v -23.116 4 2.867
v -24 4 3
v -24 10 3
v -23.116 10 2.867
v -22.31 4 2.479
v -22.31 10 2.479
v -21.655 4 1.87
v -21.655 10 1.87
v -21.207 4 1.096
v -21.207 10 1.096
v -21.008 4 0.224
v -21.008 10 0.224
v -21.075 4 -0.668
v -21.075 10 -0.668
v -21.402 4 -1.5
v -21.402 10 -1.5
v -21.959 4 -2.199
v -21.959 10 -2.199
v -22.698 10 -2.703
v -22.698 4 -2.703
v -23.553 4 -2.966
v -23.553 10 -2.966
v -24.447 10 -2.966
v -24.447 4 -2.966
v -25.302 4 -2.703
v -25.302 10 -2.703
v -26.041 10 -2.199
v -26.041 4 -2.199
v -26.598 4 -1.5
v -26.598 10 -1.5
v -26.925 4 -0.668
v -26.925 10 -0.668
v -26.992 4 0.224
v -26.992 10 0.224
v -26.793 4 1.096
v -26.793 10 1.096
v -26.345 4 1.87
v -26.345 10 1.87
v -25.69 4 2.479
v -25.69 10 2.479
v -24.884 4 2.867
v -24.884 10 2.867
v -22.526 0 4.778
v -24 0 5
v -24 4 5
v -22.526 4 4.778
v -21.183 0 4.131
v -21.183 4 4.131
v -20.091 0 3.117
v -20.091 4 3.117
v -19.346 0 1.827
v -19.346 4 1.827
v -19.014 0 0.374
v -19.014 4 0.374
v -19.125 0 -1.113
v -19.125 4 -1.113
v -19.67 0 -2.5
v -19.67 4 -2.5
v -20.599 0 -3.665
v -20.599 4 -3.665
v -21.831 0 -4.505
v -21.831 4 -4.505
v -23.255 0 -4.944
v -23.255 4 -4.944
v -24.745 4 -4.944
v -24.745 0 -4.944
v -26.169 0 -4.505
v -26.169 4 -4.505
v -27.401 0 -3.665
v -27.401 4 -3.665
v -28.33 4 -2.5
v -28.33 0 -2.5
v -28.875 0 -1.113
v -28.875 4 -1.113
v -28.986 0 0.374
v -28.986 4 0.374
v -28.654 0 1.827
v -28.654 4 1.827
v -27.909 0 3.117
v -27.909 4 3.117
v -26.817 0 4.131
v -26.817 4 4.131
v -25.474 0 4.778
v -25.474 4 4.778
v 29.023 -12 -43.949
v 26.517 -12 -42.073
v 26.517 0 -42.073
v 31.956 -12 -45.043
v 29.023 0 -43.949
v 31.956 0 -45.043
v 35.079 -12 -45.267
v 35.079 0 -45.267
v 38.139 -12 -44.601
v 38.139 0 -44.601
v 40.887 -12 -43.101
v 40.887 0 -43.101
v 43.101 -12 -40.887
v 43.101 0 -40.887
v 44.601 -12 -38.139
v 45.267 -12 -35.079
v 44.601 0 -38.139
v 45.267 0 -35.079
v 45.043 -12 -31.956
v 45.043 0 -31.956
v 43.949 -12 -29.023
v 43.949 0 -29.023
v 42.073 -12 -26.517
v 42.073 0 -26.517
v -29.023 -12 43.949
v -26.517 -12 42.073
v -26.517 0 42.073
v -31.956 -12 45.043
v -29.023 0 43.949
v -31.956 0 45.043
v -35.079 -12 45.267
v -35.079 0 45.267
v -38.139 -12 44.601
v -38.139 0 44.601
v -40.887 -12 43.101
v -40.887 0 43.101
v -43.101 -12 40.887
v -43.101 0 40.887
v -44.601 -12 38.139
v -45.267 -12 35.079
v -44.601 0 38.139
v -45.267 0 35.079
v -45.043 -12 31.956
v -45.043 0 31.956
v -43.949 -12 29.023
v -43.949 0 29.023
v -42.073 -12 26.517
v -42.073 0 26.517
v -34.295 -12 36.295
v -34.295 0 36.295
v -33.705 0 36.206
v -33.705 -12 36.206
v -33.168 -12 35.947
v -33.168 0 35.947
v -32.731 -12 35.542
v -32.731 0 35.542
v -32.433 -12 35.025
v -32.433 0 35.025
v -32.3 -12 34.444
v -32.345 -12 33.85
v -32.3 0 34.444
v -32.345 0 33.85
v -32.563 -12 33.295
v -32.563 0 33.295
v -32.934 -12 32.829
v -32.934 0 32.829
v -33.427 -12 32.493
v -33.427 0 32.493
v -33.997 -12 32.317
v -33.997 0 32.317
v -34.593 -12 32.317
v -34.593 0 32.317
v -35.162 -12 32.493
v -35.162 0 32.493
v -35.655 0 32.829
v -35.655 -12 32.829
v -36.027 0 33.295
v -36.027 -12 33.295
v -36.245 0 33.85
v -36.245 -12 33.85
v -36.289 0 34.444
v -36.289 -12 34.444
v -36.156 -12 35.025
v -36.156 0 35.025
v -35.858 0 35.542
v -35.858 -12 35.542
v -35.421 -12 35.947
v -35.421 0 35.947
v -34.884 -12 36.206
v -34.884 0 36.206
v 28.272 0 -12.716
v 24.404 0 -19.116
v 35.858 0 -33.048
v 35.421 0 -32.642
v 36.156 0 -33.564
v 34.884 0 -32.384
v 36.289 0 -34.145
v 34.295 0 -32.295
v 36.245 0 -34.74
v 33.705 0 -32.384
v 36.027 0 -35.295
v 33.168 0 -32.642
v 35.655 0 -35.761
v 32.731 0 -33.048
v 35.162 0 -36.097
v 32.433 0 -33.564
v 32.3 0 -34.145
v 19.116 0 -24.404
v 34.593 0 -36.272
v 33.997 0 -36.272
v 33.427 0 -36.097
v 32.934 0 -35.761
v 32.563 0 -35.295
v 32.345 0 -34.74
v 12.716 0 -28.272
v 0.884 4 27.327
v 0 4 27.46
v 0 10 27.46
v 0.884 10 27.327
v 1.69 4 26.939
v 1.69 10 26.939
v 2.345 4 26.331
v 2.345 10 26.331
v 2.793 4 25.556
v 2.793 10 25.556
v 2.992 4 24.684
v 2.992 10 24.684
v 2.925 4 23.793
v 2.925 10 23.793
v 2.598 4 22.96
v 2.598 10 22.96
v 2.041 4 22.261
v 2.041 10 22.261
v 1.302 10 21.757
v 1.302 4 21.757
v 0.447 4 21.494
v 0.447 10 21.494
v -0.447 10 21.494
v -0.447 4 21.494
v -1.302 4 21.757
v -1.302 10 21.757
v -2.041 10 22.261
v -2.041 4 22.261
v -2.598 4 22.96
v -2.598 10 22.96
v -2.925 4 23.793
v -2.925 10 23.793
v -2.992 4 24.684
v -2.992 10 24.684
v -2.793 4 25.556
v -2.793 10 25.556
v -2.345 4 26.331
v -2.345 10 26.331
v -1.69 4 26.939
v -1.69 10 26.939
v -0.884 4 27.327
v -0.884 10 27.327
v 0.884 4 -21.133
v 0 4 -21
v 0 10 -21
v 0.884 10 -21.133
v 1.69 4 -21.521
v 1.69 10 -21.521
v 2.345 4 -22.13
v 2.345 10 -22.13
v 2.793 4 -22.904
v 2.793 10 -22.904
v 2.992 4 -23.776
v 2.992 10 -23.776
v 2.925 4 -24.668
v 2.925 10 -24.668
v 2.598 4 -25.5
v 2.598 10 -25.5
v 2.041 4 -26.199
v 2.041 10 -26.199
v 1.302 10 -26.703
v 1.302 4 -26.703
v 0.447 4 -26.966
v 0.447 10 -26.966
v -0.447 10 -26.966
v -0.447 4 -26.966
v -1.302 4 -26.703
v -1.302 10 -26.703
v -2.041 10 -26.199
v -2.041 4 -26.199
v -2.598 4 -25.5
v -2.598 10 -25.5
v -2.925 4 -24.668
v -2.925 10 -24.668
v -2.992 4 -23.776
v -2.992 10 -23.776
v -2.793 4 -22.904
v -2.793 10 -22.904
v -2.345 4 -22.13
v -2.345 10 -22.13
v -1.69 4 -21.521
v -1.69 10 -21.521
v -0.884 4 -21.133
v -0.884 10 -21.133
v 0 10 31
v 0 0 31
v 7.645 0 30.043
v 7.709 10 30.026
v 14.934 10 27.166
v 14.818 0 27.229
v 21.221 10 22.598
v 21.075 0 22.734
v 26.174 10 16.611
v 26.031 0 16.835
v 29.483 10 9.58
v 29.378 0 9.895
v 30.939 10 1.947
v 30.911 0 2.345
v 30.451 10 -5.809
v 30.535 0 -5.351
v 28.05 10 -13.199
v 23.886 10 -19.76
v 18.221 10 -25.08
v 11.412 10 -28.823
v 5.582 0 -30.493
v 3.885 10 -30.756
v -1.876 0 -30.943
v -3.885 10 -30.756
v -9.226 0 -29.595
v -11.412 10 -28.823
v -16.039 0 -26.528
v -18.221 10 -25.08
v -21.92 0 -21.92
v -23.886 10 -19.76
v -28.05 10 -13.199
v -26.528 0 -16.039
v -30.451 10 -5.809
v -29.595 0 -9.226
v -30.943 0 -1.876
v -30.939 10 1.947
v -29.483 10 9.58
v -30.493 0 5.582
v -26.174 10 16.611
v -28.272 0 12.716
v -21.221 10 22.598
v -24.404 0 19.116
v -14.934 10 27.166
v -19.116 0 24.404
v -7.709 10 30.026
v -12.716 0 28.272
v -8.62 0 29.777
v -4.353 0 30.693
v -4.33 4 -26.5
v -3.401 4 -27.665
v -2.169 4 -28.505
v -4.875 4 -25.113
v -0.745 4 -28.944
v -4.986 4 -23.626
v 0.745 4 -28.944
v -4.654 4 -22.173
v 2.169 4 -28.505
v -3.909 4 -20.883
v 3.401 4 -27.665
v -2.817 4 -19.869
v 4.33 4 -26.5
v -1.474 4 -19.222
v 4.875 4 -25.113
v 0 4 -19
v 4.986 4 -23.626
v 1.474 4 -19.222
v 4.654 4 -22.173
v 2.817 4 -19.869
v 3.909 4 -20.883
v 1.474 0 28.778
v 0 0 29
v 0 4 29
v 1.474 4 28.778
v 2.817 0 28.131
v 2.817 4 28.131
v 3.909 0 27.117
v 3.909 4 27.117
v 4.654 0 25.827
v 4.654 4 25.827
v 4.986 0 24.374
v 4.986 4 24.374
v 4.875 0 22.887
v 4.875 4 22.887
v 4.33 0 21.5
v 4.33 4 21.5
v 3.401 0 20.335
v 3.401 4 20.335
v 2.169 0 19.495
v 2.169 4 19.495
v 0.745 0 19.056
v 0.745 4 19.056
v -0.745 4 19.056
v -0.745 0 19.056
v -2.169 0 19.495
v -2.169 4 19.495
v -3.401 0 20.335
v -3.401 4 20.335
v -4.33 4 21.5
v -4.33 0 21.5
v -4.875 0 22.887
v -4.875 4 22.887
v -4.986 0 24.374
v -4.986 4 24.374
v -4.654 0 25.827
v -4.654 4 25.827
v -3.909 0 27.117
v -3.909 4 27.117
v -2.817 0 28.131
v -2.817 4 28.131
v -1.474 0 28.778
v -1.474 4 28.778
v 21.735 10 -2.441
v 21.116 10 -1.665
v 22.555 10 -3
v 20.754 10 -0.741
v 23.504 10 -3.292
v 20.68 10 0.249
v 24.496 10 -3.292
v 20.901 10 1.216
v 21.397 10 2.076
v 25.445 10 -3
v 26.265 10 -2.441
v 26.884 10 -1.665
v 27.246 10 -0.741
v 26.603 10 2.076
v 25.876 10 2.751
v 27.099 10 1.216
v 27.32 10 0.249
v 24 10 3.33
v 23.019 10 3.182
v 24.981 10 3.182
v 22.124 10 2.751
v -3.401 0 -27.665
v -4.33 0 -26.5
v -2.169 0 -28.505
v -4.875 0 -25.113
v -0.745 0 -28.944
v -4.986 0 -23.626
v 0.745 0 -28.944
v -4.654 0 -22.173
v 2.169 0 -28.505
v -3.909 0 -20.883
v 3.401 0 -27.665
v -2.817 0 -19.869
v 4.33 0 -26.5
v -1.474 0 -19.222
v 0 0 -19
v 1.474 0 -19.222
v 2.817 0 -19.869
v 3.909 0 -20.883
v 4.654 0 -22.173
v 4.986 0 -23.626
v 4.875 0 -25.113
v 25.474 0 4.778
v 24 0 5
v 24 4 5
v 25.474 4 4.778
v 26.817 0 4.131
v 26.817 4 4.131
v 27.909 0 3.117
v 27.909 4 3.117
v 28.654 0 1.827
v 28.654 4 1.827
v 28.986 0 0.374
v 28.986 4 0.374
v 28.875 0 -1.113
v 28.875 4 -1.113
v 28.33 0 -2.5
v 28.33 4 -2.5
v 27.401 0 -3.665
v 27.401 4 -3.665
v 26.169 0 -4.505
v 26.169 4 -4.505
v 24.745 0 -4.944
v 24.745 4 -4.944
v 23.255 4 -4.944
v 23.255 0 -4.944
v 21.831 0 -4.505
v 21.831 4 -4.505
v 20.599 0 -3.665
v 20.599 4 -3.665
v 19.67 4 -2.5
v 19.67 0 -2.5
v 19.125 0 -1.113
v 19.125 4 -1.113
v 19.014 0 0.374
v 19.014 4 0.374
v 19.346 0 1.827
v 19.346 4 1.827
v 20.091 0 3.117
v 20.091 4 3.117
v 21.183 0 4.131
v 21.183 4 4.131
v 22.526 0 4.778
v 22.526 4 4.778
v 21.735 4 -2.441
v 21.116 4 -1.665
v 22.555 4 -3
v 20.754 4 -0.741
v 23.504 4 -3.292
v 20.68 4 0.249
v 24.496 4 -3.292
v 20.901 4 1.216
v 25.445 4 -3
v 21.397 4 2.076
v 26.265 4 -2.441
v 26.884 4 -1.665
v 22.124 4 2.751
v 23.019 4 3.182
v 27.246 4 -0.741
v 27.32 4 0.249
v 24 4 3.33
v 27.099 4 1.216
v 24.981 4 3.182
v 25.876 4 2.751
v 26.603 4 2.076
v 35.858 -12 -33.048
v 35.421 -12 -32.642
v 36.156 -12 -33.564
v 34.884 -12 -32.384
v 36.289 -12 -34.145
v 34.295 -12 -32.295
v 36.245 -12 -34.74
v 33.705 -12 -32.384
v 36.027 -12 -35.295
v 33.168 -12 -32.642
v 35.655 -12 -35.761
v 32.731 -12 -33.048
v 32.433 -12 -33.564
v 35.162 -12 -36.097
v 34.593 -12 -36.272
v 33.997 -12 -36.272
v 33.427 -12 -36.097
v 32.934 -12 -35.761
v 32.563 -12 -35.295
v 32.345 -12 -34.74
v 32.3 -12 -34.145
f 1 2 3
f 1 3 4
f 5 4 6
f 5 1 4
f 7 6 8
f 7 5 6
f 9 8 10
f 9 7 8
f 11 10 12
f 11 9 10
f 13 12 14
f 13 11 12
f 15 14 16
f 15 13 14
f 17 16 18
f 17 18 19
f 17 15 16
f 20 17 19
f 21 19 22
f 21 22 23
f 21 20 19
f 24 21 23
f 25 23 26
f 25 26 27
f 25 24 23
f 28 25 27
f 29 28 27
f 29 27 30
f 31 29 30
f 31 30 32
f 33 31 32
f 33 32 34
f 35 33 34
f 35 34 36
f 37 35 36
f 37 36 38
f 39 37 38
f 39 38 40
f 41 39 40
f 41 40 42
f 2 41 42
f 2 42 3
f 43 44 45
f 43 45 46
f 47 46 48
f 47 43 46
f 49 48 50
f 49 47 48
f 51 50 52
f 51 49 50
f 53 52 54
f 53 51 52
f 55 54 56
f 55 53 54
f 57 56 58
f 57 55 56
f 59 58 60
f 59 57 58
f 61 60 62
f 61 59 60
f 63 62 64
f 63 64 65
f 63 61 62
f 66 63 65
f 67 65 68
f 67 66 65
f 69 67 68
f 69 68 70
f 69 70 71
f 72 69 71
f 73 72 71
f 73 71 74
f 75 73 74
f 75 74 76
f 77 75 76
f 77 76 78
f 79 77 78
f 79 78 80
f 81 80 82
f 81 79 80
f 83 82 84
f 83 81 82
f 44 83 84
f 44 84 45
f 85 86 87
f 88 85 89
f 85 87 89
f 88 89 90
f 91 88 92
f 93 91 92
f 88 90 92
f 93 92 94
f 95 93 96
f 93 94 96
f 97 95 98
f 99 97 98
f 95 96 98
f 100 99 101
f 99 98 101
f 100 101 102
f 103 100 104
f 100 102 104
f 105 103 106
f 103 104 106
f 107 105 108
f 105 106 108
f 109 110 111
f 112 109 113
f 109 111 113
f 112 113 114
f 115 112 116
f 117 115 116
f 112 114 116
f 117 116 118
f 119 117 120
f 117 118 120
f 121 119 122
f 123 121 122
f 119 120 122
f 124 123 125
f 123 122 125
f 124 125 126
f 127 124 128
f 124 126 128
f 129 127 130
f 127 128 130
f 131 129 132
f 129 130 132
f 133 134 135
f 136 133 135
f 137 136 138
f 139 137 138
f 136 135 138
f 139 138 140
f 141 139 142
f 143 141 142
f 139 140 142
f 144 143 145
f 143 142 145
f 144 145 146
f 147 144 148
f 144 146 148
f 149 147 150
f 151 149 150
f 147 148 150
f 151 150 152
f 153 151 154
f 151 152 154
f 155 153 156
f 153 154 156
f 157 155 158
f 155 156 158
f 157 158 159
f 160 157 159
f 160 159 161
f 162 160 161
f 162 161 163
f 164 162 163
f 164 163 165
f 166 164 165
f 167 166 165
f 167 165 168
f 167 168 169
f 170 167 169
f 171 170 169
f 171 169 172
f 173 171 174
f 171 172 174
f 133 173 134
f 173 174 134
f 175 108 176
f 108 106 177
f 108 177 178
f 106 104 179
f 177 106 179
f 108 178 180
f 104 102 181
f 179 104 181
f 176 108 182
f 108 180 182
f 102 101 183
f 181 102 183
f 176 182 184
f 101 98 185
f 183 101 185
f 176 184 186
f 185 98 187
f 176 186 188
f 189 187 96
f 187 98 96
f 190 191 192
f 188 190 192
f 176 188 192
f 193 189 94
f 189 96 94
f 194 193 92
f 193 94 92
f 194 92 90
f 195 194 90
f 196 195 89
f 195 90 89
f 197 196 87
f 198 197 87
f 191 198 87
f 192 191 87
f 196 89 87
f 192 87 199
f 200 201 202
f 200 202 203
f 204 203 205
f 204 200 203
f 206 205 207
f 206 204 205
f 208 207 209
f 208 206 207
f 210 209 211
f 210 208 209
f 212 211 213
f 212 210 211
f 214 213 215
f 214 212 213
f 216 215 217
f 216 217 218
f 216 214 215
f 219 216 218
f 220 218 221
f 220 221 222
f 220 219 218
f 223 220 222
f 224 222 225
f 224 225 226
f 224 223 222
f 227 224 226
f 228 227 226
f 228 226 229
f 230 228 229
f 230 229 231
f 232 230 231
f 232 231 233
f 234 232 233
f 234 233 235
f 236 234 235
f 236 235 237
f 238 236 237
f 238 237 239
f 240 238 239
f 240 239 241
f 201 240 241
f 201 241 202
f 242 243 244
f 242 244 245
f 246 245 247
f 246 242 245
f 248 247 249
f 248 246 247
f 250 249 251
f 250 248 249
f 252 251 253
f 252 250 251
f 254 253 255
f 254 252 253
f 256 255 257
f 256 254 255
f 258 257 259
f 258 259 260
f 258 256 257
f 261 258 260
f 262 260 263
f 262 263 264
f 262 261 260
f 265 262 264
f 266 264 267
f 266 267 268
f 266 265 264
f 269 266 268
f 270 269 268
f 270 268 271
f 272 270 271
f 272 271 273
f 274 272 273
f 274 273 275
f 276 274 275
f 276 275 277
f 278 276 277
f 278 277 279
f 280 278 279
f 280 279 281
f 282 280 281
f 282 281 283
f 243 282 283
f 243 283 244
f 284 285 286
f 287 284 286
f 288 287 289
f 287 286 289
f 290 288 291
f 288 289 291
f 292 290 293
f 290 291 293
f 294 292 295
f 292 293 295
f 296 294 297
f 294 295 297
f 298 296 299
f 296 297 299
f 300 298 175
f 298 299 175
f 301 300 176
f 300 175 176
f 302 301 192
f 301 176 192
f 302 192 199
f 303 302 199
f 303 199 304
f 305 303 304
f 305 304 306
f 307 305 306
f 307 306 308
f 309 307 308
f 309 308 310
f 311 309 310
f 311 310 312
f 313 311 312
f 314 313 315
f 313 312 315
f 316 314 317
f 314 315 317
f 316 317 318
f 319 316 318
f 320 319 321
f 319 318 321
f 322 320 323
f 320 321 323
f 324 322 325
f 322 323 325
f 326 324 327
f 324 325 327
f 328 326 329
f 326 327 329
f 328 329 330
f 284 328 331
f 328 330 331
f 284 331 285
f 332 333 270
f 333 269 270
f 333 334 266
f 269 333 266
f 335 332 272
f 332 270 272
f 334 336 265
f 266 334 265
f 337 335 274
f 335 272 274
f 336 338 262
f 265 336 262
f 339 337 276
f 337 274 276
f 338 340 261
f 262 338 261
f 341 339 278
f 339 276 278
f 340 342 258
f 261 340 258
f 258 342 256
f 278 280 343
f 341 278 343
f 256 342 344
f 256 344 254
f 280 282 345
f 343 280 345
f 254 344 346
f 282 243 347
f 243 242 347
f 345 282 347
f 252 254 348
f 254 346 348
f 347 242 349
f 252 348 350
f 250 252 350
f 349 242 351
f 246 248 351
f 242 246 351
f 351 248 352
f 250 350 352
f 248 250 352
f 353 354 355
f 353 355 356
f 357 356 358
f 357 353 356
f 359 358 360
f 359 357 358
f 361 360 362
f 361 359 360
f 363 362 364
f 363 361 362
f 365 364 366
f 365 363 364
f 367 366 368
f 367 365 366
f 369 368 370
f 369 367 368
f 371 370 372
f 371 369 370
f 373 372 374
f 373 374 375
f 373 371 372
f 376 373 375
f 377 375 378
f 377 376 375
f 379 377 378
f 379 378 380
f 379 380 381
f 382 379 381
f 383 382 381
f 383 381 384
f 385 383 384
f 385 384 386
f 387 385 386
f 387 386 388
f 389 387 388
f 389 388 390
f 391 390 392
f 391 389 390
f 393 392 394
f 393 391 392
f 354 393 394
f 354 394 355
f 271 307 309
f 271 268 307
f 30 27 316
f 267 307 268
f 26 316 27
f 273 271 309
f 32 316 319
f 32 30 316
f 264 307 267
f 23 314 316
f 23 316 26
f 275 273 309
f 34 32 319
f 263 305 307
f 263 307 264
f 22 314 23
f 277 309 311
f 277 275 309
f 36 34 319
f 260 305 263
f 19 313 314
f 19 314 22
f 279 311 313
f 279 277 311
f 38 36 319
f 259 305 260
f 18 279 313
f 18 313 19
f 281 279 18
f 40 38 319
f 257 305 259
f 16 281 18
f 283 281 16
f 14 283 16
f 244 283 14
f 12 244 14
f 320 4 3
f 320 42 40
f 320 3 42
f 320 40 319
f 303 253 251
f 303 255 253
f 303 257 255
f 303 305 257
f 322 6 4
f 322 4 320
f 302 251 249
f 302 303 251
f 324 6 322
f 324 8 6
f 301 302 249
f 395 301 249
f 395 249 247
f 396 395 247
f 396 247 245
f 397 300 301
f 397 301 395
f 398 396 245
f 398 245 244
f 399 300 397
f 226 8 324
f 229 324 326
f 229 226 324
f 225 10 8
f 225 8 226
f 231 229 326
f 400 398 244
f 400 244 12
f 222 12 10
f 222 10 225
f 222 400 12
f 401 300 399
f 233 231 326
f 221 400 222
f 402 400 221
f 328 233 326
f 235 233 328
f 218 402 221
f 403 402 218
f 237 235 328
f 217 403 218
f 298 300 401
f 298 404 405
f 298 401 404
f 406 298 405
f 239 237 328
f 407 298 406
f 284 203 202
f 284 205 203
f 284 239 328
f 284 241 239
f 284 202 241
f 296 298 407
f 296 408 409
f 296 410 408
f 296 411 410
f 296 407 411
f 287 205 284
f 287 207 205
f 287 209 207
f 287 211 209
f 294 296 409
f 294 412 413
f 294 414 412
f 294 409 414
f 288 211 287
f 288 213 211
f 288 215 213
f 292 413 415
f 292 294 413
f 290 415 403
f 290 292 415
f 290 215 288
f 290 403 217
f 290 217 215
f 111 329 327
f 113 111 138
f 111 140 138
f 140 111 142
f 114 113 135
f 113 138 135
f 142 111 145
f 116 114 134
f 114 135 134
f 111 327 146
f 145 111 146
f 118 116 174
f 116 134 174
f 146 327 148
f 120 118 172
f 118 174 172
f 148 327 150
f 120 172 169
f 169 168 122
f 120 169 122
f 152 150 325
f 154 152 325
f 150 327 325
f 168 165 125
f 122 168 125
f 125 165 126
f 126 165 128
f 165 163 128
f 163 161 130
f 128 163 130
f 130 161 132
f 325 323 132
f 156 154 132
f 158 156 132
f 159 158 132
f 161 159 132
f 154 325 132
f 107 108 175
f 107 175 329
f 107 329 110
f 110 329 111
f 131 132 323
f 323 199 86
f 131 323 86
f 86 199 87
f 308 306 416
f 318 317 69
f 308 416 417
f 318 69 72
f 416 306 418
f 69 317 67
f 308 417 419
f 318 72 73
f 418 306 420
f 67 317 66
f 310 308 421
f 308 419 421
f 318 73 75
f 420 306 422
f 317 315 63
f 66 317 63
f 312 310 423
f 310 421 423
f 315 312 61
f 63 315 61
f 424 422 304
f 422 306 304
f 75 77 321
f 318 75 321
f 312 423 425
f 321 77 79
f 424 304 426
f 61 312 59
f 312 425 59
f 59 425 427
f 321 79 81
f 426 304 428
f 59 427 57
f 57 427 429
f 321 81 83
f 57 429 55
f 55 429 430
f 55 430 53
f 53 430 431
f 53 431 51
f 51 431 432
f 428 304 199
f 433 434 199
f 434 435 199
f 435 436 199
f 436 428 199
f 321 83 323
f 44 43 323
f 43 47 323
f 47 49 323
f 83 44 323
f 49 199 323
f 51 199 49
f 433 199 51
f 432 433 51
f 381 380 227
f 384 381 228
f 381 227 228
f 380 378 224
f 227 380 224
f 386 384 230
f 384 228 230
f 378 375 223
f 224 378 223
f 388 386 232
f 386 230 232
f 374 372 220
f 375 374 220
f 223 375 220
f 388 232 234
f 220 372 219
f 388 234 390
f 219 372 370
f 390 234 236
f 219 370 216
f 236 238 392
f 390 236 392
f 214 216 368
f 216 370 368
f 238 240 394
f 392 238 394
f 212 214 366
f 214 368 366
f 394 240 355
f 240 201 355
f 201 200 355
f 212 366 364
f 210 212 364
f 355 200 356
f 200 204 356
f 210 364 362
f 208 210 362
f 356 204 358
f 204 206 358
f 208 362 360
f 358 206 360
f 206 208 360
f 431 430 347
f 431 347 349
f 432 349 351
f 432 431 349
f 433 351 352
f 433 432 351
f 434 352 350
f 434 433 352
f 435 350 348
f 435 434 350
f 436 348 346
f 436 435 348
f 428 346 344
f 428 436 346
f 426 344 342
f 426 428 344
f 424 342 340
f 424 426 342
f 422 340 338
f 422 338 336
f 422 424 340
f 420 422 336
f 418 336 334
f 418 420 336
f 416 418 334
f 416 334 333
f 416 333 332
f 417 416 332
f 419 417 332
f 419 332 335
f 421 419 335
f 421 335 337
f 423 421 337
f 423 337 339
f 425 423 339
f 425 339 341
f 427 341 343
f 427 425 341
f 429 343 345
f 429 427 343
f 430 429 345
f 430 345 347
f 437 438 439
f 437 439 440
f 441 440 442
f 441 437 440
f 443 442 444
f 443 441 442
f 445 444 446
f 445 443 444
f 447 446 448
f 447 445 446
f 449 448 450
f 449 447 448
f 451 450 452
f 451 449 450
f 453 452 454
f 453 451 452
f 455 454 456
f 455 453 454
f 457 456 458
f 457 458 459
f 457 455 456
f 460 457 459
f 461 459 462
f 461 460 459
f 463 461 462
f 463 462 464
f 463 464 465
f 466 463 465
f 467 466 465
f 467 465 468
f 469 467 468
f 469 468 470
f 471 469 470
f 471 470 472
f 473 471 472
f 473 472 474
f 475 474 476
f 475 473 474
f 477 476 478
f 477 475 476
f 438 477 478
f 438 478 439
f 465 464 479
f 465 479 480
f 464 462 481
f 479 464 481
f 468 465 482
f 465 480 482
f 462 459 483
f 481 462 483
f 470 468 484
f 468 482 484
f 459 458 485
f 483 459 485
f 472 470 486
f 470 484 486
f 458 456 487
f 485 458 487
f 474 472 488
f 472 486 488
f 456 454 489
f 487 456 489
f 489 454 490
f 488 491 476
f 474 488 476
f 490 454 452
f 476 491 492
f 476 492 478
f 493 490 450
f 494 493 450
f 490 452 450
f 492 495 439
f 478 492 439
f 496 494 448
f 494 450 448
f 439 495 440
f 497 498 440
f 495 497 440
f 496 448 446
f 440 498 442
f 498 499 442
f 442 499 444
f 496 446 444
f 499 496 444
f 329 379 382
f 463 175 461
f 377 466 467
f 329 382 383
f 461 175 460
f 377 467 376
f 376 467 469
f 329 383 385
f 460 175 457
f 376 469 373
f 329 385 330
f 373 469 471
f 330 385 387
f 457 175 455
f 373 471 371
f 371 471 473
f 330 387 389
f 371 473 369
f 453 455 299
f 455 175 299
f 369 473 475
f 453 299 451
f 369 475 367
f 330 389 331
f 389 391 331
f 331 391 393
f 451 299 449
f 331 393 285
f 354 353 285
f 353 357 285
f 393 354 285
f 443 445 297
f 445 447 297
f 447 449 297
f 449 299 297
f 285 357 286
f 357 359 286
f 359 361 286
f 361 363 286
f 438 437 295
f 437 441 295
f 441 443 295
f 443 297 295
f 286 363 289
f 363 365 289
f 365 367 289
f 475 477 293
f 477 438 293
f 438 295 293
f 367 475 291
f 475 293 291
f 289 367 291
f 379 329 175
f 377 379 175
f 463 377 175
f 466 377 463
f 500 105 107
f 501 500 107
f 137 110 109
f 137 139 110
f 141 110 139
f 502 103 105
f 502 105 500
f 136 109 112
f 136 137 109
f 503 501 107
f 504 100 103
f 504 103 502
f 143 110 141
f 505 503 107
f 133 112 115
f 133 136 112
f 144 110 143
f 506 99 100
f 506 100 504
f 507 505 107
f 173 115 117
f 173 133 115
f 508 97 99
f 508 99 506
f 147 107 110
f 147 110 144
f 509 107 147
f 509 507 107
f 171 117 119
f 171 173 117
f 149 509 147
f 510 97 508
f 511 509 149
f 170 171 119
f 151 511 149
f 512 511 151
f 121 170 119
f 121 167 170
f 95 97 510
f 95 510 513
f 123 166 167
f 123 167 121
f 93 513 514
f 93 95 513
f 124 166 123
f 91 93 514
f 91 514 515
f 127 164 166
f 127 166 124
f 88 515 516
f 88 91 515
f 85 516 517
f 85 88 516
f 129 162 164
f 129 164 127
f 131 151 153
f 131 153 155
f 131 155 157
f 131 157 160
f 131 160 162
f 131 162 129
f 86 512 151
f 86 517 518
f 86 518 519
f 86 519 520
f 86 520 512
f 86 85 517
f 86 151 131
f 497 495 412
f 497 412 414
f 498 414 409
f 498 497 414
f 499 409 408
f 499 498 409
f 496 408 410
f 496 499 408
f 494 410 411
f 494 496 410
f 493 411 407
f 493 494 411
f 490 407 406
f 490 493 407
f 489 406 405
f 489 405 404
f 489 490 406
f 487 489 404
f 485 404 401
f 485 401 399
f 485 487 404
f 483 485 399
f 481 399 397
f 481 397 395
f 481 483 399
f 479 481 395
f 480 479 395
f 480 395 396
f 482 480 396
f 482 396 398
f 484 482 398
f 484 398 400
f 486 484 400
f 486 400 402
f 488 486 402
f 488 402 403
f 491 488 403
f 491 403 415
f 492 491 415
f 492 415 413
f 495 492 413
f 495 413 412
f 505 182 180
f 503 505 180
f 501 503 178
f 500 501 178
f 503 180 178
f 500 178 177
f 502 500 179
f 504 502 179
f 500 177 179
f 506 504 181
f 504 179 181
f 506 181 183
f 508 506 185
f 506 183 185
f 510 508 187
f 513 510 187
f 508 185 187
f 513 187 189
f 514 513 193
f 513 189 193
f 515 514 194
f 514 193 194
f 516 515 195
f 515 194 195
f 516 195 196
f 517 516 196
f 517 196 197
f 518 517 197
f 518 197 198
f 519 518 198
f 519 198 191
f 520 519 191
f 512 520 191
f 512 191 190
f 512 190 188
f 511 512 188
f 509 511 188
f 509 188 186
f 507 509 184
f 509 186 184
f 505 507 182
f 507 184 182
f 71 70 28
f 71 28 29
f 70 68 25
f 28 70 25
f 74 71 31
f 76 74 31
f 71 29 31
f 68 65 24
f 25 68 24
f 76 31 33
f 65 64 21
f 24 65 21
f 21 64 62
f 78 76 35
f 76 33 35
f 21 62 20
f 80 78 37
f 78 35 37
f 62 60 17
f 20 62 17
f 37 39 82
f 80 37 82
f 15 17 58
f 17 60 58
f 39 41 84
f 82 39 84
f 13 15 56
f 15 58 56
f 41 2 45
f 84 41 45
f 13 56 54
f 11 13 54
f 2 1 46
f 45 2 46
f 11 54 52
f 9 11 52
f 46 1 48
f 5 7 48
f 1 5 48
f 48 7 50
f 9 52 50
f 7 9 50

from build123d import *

# Parameters (mm, degrees)
SKETCH1_R           = 31
BOSS_EXTRUDE1_DEPTH = 10
SKETCH3_R           = 5
CUT_EXTRUDE1_DEPTH  = 4
SKETCH5_R           = 5
CUT_EXTRUDE2_DEPTH  = 4
SKETCH6_R           = 3
SKETCH6_R_2         = 3.329647993
CUT_EXTRUDE3_DEPTH  = 10
SKETCH10_R          = 2
BOSS_EXTRUDE5_DEPTH = 12


with BuildPart() as part:
    # Sketch1 → Boss-Extrude1 (new body)
    with BuildSketch(Plane(origin=(0, 0, 0), x_dir=(1, 0, 0), z_dir=(0, 1, 0))):
        with Locations(Location((0, 0, 0), (0, 0, 270))):
            Circle(SKETCH1_R)
    extrude(amount=BOSS_EXTRUDE1_DEPTH)

    # Sketch3 → Cut-Extrude1 (cut)
    with BuildSketch(Plane(origin=(0, 0, 0), x_dir=(1, 0, 0), z_dir=(0, 1, 0))):
        with Locations(Location((0, 24, 0), (0, 0, 270))):
            Circle(SKETCH3_R)
    extrude(amount=CUT_EXTRUDE1_DEPTH, mode=Mode.SUBTRACT)

    # Sketch5 → Cut-Extrude2 (cut)
    with BuildSketch(Plane(origin=(0, 0, 0), x_dir=(1, 0, 0), z_dir=(0, 1, 0))):
        with Locations(Location((-24, 0, 0), (0, 0, 270))):
            Circle(SKETCH5_R)
        with Locations(Location((24, 0, 0), (0, 0, 270))):
            Circle(SKETCH5_R)
        with Locations(Location((0, -24, 0), (0, 0, 270))):
            Circle(SKETCH5_R)
    extrude(amount=CUT_EXTRUDE2_DEPTH, mode=Mode.SUBTRACT)

    # Sketch6 → Cut-Extrude3 (cut)
    with BuildSketch(Plane(origin=(0, 0, 0), x_dir=(1, 0, 0), z_dir=(0, 1, 0))):
        with Locations(Location((0, -24.460265292, 0), (0, 0, 270))):
            Circle(SKETCH6_R)
        with Locations(Location((-24, 0, 0), (0, 0, 270))):
            Circle(SKETCH6_R)
        with Locations(Location((24, 0, 0), (0, 0, 270))):
            Circle(SKETCH6_R_2)
        with Locations(Location((0, 24, 0), (0, 0, 270))):
            Circle(SKETCH6_R)
    extrude(amount=CUT_EXTRUDE3_DEPTH, mode=Mode.SUBTRACT)

    # Sketch10 → Boss-Extrude5 (add)
    with BuildSketch(Plane(origin=(0, 0, 0), x_dir=(1, 0, 0), z_dir=(0, 1, 0))):
        with BuildLine():
            Line((-42.072853481, -26.516504294), (26.516504294, 42.072853481))
            ThreePointArc((26.516504294, 42.072853481), (42.072853481, 42.072853481), (42.072853481, 26.516504294))
            Line((42.072853481, 26.516504294), (-26.516504294, -42.072853481))
            ThreePointArc((-26.516504294, -42.072853481), (-42.072853481, -42.072853481), (-42.072853481, -26.516504294))
        make_face()
        with Locations(Location((34.294678888, 34.294678888, 0), (0, 0, 270))):
            Circle(SKETCH10_R, mode=Mode.SUBTRACT)
        with Locations(Location((-34.294678888, -34.294678888, 0), (0, 0, 270))):
            Circle(SKETCH10_R, mode=Mode.SUBTRACT)
    extrude(amount=-BOSS_EXTRUDE5_DEPTH)


solid = part.part
